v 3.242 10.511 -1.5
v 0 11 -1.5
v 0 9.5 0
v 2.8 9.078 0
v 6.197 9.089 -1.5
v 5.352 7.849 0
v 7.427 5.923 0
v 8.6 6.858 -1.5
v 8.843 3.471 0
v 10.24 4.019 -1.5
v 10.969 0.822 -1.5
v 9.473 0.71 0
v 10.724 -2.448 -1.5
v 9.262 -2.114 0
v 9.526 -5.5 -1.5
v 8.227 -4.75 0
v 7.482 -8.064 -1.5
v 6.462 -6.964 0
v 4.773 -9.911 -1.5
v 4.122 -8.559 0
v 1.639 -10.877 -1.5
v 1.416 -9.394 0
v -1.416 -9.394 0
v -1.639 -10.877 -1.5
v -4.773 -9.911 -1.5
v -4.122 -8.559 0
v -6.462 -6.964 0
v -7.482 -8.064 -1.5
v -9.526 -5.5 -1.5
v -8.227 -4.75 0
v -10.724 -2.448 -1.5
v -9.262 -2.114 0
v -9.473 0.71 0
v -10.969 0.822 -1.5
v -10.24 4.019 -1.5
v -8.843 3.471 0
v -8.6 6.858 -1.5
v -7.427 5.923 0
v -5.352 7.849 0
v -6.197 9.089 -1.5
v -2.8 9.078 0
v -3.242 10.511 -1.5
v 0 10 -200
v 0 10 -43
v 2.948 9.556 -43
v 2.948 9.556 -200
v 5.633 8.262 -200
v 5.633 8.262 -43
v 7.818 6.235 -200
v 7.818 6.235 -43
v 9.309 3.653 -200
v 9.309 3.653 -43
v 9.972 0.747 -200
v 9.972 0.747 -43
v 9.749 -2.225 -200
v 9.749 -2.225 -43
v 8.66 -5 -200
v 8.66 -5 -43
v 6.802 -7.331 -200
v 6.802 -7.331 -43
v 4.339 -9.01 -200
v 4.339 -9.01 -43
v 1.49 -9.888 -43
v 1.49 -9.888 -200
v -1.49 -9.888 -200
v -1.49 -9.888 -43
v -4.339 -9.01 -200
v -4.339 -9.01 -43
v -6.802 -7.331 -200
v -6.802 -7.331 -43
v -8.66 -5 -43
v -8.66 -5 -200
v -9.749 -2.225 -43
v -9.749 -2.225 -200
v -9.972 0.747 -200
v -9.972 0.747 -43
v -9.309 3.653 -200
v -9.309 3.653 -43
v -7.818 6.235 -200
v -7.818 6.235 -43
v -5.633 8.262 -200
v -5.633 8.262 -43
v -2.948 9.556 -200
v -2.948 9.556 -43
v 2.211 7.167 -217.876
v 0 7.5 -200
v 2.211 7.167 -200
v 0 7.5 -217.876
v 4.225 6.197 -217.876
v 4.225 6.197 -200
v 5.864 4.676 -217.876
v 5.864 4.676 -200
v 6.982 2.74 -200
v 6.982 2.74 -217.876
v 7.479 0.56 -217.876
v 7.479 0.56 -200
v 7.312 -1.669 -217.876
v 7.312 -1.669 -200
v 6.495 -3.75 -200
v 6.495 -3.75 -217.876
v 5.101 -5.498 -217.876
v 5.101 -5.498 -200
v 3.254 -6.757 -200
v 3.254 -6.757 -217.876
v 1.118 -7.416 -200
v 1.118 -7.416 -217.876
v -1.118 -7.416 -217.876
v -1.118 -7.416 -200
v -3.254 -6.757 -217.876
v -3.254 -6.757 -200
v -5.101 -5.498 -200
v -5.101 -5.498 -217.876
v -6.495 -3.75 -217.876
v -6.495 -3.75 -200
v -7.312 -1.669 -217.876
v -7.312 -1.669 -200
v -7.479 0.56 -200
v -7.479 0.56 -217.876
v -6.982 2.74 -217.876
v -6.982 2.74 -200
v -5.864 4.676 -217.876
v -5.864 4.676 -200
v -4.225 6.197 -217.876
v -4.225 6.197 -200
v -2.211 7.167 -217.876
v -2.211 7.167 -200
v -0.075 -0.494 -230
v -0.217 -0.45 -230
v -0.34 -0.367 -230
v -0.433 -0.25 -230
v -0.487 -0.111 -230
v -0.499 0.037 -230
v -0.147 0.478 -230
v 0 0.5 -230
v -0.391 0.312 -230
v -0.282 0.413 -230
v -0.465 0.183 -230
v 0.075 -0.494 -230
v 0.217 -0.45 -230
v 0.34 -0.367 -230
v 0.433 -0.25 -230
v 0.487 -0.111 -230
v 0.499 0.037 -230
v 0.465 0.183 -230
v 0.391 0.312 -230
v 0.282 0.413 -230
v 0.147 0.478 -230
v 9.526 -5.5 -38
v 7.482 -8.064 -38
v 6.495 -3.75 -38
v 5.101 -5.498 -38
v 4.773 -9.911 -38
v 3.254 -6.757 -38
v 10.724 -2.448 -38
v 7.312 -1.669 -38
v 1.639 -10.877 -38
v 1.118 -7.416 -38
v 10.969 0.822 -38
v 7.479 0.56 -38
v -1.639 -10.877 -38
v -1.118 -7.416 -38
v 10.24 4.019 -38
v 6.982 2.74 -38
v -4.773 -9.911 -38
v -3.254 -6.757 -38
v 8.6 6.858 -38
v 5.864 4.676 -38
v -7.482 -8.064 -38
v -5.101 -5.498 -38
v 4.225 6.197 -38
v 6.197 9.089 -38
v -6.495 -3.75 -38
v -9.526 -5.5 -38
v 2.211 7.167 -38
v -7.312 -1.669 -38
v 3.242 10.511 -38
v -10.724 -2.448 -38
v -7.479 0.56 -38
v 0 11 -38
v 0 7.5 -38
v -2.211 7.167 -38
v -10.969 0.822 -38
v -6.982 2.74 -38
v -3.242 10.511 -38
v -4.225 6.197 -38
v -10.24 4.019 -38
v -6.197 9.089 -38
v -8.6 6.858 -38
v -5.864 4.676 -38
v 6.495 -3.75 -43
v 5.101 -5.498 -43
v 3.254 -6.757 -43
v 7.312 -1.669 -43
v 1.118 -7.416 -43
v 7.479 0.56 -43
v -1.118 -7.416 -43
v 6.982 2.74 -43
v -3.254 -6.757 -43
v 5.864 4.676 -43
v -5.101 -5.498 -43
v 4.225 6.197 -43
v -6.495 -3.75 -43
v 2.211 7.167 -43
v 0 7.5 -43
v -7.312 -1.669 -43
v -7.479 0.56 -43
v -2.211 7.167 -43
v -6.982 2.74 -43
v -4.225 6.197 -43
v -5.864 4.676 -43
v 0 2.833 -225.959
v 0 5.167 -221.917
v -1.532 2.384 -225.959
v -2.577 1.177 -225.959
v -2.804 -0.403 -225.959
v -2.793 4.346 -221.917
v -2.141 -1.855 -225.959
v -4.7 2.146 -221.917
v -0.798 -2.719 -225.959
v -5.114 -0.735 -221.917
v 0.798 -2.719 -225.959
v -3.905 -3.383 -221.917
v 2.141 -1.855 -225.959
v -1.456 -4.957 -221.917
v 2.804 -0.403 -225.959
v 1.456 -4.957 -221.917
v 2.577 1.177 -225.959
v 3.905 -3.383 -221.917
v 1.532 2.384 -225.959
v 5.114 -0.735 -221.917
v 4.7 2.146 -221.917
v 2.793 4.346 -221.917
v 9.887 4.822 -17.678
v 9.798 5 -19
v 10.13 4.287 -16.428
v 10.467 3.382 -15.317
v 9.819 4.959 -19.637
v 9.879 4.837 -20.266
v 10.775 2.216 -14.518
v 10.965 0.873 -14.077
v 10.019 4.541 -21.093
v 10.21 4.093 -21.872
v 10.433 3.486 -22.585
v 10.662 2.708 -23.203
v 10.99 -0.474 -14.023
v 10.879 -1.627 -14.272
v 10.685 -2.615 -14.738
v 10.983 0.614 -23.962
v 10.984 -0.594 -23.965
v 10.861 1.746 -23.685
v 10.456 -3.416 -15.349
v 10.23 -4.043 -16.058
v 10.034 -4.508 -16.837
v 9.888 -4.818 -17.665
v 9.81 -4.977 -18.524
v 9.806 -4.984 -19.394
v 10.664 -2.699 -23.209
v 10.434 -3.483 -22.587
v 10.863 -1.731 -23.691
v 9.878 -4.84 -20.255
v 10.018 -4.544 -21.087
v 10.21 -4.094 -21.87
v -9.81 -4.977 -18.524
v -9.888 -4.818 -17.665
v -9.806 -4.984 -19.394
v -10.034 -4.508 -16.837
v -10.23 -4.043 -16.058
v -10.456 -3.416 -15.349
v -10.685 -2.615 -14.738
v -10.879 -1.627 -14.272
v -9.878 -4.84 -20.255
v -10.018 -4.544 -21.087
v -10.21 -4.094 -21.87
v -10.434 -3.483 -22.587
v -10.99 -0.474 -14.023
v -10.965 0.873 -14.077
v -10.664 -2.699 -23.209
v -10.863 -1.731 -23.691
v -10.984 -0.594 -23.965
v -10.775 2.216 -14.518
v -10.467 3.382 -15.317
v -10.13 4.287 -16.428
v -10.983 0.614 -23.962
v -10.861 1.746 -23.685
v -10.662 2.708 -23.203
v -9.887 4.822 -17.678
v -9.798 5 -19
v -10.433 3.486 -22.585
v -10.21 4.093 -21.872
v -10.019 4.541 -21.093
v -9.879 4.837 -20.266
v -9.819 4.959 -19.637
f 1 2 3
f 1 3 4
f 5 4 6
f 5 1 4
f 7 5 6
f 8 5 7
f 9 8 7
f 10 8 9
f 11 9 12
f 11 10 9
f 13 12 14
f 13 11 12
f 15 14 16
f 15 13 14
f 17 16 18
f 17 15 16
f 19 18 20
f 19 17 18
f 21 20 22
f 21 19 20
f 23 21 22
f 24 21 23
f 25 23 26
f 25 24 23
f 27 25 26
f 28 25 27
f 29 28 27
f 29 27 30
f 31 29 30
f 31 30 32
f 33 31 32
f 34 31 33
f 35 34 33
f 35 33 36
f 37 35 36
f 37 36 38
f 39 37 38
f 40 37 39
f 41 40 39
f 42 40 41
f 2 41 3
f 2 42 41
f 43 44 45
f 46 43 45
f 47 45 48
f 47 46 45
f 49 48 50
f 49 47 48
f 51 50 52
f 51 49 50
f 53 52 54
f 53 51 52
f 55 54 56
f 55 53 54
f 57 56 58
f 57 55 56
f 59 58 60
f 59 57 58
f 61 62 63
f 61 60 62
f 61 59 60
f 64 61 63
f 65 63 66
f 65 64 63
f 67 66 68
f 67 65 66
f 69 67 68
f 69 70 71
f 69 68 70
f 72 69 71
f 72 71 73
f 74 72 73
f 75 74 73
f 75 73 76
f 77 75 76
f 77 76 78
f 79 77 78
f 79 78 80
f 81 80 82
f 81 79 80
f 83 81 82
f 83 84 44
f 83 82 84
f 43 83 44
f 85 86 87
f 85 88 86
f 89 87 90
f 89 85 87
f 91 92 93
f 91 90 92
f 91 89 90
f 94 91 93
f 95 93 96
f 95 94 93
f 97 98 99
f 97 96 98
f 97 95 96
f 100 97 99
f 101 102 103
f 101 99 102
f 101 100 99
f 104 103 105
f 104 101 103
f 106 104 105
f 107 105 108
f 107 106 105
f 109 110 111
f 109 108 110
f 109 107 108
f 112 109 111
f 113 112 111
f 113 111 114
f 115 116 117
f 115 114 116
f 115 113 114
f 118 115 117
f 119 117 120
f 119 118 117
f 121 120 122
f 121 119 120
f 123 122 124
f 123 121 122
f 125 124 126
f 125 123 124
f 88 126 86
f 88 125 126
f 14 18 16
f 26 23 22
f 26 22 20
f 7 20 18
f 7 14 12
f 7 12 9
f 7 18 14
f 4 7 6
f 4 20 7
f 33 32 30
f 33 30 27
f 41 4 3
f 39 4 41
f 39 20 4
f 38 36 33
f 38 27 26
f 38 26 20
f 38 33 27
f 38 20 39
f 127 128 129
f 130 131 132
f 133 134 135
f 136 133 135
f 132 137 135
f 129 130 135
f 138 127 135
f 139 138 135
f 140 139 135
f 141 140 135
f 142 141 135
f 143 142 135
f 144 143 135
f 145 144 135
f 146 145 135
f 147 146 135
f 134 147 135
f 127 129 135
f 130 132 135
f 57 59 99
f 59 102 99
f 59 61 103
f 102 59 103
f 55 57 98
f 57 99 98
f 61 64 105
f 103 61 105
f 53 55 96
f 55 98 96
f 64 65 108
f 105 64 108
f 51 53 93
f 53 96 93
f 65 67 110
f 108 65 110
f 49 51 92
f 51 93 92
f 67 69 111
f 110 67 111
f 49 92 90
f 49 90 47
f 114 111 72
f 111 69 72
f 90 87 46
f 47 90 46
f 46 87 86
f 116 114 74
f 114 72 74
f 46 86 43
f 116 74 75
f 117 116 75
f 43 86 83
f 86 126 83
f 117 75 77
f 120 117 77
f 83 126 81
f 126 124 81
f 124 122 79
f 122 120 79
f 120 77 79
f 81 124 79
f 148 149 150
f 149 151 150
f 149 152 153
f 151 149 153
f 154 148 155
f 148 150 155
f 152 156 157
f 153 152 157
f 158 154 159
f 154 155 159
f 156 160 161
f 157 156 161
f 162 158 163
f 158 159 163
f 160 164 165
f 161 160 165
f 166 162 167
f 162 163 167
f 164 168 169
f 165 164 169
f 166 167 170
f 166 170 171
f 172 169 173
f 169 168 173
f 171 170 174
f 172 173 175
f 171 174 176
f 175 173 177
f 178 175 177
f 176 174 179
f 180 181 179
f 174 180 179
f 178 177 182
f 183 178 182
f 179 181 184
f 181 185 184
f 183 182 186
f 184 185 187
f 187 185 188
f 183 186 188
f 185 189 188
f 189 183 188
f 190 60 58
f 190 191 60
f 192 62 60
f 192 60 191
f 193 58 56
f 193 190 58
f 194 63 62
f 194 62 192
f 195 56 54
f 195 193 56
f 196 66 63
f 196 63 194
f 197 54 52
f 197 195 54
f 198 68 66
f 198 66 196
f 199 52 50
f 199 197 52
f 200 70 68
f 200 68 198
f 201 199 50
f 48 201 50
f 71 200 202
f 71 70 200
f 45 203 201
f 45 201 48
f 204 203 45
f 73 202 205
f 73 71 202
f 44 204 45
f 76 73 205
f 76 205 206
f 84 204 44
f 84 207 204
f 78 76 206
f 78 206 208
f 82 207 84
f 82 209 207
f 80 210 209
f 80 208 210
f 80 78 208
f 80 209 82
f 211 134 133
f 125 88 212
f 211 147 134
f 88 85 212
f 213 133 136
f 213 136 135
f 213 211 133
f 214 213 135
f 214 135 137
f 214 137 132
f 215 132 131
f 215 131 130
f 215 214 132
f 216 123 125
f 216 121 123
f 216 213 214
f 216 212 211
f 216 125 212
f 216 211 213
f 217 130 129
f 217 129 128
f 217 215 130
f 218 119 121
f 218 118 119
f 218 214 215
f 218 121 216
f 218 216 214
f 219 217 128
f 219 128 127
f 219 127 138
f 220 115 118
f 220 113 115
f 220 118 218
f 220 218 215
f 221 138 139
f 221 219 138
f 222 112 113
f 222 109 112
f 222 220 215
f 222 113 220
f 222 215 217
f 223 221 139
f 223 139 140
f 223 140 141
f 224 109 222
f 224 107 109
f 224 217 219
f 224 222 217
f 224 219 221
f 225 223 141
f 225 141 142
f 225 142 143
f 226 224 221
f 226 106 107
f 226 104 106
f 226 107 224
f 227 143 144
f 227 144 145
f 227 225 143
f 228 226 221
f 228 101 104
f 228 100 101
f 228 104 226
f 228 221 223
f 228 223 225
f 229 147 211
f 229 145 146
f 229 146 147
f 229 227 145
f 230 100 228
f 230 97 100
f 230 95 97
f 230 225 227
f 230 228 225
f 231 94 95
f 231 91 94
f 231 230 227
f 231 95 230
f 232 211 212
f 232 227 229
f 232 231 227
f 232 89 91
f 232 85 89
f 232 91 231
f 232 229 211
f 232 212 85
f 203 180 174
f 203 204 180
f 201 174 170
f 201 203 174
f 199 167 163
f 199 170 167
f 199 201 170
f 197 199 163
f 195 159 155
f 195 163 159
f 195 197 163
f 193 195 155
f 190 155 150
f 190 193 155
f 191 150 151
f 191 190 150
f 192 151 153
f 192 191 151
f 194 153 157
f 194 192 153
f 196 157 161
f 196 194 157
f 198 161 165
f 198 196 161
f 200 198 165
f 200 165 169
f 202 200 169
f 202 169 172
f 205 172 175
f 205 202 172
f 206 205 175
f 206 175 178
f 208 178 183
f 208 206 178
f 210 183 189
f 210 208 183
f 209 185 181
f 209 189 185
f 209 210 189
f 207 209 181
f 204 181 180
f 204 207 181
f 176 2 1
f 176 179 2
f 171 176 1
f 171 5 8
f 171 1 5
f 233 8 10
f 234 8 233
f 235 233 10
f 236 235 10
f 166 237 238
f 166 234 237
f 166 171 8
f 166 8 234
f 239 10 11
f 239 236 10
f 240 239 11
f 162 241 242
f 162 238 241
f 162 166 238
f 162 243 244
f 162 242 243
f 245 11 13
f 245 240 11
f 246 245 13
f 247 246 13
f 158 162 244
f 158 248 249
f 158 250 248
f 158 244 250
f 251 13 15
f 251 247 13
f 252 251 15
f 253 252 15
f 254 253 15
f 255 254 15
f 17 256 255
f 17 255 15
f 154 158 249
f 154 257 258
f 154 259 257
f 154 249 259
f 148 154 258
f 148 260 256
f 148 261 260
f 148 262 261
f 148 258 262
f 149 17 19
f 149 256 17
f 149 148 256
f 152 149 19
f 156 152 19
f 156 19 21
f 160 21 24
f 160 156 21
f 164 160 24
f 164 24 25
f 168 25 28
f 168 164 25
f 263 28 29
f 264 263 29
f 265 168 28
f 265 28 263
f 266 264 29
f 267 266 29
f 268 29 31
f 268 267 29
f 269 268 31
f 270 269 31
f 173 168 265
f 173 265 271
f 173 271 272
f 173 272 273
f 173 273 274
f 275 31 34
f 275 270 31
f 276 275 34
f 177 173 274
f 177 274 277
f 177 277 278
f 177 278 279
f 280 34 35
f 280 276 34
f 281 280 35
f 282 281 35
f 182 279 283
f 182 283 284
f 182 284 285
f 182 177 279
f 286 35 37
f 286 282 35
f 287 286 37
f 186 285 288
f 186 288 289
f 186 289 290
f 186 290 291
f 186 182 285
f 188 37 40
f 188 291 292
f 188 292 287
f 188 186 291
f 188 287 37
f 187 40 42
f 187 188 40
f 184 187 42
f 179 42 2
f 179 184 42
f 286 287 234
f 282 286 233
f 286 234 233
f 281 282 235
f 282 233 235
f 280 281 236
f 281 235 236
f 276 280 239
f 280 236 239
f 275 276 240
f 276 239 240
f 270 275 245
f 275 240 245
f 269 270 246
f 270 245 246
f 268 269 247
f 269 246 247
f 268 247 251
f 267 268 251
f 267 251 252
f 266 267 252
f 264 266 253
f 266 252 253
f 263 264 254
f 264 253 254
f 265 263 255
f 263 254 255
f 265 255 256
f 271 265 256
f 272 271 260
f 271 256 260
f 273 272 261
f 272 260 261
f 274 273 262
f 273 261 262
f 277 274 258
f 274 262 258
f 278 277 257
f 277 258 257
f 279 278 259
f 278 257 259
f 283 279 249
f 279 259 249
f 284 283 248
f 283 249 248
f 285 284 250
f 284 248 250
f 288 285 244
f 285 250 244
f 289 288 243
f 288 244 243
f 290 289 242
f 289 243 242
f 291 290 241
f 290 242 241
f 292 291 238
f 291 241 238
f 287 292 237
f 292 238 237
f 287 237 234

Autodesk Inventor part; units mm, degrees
ref_plane "XZ Plane" through (0, 0, 0) normal (0, 1, 0) x (-1, 0, 0)
ref_plane "XY Plane" through (0, 0, 0) normal (0, 0, 1) x (1, 0, 0)
sketch "Sketch1" plane through (0, 0, 0) normal (1, 0, 0) x (0, 1, 0)
  line L0 (0, 0) -> (9.5, 0)
  line L1 (0, 0) -> (9.5, 0) construction
  line L2 (11, -1.5) -> (11, -38)
  line L3 (11, -38) -> (7.5, -38)
  line L4 (7.5, -38) -> (7.5, -43)
  line L5 (7.5, -43) -> (10, -43)
  line L6 (10, -43) -> (10, -200)
  line L7 (10, -200) -> (7.5, -200)
  line L8 (7.5, -200) -> (7.5, -217.8756)
  line L9 (0.5, -230) -> (0, -230)
  line L10 (0, -230) -> (0, 0)
  line L11 (0.5, -230) -> (7.5, -217.8756)
  line L12 (11, -1.5) -> (9.5, 0)
  line L13 (34.8708, -0.75) -> (56.3474, -0.75)
  line L14 (56.3474, -0.75) -> (56.3474, -28.5061)
  line L15 (56.3474, -28.5061) -> (34.8708, -28.5061)
  line L16 (34.8708, -28.5061) -> (34.8708, -0.75)
  point P0 (11, 0)
  point P1 (7.5, -230)
  point P2 (0.25, -230)
  dimension "d7" = 11
  dimension "d8" = 0
  dimension "d9" = 38
  dimension "d10" = 90
  dimension "d11" = 3.5
  dimension "d12" = 5
  dimension "d13" = 2.5
  dimension "d14" = 157
  dimension "d15" = 90
  dimension "d16" = 2.5
  dimension "d17" = 30
  dimension "d18" = 7.5
  dimension "d19" = 7.25
  dimension "d20" = 7
  dimension "d21" = 60
  dimension "d22" = 1.5
  dimension "d23" = 1.5
revolve "Revolution1" add sketch "Sketch1" angle 360 about axis through (0, 0, -230) along (0, 0, 1) contours L0 L12 L2 L3 L4 L5 L6 L7 L8 L11 L9 L10
thread "Thread1" size "M20x2.5" class "6g" standard "ISO Metric profile" full length
sketch "Sketch4" plane through (0, 0, 0) normal (1, 0, 0) x (0, 1, 0)
  circle A0 centre (0, -19) radius 5
  line L0 (9.5, 0) -> (-9.5, 0) projected
  point P0 (0, 0)
  dimension "d27" = 10
  dimension "d28" = 19
extrude "Extrusion1" cut sketch "Sketch4" along normal mid plane 40
equation "\"d23\" = d22"
properties part number "atividade_14A_eixo"
